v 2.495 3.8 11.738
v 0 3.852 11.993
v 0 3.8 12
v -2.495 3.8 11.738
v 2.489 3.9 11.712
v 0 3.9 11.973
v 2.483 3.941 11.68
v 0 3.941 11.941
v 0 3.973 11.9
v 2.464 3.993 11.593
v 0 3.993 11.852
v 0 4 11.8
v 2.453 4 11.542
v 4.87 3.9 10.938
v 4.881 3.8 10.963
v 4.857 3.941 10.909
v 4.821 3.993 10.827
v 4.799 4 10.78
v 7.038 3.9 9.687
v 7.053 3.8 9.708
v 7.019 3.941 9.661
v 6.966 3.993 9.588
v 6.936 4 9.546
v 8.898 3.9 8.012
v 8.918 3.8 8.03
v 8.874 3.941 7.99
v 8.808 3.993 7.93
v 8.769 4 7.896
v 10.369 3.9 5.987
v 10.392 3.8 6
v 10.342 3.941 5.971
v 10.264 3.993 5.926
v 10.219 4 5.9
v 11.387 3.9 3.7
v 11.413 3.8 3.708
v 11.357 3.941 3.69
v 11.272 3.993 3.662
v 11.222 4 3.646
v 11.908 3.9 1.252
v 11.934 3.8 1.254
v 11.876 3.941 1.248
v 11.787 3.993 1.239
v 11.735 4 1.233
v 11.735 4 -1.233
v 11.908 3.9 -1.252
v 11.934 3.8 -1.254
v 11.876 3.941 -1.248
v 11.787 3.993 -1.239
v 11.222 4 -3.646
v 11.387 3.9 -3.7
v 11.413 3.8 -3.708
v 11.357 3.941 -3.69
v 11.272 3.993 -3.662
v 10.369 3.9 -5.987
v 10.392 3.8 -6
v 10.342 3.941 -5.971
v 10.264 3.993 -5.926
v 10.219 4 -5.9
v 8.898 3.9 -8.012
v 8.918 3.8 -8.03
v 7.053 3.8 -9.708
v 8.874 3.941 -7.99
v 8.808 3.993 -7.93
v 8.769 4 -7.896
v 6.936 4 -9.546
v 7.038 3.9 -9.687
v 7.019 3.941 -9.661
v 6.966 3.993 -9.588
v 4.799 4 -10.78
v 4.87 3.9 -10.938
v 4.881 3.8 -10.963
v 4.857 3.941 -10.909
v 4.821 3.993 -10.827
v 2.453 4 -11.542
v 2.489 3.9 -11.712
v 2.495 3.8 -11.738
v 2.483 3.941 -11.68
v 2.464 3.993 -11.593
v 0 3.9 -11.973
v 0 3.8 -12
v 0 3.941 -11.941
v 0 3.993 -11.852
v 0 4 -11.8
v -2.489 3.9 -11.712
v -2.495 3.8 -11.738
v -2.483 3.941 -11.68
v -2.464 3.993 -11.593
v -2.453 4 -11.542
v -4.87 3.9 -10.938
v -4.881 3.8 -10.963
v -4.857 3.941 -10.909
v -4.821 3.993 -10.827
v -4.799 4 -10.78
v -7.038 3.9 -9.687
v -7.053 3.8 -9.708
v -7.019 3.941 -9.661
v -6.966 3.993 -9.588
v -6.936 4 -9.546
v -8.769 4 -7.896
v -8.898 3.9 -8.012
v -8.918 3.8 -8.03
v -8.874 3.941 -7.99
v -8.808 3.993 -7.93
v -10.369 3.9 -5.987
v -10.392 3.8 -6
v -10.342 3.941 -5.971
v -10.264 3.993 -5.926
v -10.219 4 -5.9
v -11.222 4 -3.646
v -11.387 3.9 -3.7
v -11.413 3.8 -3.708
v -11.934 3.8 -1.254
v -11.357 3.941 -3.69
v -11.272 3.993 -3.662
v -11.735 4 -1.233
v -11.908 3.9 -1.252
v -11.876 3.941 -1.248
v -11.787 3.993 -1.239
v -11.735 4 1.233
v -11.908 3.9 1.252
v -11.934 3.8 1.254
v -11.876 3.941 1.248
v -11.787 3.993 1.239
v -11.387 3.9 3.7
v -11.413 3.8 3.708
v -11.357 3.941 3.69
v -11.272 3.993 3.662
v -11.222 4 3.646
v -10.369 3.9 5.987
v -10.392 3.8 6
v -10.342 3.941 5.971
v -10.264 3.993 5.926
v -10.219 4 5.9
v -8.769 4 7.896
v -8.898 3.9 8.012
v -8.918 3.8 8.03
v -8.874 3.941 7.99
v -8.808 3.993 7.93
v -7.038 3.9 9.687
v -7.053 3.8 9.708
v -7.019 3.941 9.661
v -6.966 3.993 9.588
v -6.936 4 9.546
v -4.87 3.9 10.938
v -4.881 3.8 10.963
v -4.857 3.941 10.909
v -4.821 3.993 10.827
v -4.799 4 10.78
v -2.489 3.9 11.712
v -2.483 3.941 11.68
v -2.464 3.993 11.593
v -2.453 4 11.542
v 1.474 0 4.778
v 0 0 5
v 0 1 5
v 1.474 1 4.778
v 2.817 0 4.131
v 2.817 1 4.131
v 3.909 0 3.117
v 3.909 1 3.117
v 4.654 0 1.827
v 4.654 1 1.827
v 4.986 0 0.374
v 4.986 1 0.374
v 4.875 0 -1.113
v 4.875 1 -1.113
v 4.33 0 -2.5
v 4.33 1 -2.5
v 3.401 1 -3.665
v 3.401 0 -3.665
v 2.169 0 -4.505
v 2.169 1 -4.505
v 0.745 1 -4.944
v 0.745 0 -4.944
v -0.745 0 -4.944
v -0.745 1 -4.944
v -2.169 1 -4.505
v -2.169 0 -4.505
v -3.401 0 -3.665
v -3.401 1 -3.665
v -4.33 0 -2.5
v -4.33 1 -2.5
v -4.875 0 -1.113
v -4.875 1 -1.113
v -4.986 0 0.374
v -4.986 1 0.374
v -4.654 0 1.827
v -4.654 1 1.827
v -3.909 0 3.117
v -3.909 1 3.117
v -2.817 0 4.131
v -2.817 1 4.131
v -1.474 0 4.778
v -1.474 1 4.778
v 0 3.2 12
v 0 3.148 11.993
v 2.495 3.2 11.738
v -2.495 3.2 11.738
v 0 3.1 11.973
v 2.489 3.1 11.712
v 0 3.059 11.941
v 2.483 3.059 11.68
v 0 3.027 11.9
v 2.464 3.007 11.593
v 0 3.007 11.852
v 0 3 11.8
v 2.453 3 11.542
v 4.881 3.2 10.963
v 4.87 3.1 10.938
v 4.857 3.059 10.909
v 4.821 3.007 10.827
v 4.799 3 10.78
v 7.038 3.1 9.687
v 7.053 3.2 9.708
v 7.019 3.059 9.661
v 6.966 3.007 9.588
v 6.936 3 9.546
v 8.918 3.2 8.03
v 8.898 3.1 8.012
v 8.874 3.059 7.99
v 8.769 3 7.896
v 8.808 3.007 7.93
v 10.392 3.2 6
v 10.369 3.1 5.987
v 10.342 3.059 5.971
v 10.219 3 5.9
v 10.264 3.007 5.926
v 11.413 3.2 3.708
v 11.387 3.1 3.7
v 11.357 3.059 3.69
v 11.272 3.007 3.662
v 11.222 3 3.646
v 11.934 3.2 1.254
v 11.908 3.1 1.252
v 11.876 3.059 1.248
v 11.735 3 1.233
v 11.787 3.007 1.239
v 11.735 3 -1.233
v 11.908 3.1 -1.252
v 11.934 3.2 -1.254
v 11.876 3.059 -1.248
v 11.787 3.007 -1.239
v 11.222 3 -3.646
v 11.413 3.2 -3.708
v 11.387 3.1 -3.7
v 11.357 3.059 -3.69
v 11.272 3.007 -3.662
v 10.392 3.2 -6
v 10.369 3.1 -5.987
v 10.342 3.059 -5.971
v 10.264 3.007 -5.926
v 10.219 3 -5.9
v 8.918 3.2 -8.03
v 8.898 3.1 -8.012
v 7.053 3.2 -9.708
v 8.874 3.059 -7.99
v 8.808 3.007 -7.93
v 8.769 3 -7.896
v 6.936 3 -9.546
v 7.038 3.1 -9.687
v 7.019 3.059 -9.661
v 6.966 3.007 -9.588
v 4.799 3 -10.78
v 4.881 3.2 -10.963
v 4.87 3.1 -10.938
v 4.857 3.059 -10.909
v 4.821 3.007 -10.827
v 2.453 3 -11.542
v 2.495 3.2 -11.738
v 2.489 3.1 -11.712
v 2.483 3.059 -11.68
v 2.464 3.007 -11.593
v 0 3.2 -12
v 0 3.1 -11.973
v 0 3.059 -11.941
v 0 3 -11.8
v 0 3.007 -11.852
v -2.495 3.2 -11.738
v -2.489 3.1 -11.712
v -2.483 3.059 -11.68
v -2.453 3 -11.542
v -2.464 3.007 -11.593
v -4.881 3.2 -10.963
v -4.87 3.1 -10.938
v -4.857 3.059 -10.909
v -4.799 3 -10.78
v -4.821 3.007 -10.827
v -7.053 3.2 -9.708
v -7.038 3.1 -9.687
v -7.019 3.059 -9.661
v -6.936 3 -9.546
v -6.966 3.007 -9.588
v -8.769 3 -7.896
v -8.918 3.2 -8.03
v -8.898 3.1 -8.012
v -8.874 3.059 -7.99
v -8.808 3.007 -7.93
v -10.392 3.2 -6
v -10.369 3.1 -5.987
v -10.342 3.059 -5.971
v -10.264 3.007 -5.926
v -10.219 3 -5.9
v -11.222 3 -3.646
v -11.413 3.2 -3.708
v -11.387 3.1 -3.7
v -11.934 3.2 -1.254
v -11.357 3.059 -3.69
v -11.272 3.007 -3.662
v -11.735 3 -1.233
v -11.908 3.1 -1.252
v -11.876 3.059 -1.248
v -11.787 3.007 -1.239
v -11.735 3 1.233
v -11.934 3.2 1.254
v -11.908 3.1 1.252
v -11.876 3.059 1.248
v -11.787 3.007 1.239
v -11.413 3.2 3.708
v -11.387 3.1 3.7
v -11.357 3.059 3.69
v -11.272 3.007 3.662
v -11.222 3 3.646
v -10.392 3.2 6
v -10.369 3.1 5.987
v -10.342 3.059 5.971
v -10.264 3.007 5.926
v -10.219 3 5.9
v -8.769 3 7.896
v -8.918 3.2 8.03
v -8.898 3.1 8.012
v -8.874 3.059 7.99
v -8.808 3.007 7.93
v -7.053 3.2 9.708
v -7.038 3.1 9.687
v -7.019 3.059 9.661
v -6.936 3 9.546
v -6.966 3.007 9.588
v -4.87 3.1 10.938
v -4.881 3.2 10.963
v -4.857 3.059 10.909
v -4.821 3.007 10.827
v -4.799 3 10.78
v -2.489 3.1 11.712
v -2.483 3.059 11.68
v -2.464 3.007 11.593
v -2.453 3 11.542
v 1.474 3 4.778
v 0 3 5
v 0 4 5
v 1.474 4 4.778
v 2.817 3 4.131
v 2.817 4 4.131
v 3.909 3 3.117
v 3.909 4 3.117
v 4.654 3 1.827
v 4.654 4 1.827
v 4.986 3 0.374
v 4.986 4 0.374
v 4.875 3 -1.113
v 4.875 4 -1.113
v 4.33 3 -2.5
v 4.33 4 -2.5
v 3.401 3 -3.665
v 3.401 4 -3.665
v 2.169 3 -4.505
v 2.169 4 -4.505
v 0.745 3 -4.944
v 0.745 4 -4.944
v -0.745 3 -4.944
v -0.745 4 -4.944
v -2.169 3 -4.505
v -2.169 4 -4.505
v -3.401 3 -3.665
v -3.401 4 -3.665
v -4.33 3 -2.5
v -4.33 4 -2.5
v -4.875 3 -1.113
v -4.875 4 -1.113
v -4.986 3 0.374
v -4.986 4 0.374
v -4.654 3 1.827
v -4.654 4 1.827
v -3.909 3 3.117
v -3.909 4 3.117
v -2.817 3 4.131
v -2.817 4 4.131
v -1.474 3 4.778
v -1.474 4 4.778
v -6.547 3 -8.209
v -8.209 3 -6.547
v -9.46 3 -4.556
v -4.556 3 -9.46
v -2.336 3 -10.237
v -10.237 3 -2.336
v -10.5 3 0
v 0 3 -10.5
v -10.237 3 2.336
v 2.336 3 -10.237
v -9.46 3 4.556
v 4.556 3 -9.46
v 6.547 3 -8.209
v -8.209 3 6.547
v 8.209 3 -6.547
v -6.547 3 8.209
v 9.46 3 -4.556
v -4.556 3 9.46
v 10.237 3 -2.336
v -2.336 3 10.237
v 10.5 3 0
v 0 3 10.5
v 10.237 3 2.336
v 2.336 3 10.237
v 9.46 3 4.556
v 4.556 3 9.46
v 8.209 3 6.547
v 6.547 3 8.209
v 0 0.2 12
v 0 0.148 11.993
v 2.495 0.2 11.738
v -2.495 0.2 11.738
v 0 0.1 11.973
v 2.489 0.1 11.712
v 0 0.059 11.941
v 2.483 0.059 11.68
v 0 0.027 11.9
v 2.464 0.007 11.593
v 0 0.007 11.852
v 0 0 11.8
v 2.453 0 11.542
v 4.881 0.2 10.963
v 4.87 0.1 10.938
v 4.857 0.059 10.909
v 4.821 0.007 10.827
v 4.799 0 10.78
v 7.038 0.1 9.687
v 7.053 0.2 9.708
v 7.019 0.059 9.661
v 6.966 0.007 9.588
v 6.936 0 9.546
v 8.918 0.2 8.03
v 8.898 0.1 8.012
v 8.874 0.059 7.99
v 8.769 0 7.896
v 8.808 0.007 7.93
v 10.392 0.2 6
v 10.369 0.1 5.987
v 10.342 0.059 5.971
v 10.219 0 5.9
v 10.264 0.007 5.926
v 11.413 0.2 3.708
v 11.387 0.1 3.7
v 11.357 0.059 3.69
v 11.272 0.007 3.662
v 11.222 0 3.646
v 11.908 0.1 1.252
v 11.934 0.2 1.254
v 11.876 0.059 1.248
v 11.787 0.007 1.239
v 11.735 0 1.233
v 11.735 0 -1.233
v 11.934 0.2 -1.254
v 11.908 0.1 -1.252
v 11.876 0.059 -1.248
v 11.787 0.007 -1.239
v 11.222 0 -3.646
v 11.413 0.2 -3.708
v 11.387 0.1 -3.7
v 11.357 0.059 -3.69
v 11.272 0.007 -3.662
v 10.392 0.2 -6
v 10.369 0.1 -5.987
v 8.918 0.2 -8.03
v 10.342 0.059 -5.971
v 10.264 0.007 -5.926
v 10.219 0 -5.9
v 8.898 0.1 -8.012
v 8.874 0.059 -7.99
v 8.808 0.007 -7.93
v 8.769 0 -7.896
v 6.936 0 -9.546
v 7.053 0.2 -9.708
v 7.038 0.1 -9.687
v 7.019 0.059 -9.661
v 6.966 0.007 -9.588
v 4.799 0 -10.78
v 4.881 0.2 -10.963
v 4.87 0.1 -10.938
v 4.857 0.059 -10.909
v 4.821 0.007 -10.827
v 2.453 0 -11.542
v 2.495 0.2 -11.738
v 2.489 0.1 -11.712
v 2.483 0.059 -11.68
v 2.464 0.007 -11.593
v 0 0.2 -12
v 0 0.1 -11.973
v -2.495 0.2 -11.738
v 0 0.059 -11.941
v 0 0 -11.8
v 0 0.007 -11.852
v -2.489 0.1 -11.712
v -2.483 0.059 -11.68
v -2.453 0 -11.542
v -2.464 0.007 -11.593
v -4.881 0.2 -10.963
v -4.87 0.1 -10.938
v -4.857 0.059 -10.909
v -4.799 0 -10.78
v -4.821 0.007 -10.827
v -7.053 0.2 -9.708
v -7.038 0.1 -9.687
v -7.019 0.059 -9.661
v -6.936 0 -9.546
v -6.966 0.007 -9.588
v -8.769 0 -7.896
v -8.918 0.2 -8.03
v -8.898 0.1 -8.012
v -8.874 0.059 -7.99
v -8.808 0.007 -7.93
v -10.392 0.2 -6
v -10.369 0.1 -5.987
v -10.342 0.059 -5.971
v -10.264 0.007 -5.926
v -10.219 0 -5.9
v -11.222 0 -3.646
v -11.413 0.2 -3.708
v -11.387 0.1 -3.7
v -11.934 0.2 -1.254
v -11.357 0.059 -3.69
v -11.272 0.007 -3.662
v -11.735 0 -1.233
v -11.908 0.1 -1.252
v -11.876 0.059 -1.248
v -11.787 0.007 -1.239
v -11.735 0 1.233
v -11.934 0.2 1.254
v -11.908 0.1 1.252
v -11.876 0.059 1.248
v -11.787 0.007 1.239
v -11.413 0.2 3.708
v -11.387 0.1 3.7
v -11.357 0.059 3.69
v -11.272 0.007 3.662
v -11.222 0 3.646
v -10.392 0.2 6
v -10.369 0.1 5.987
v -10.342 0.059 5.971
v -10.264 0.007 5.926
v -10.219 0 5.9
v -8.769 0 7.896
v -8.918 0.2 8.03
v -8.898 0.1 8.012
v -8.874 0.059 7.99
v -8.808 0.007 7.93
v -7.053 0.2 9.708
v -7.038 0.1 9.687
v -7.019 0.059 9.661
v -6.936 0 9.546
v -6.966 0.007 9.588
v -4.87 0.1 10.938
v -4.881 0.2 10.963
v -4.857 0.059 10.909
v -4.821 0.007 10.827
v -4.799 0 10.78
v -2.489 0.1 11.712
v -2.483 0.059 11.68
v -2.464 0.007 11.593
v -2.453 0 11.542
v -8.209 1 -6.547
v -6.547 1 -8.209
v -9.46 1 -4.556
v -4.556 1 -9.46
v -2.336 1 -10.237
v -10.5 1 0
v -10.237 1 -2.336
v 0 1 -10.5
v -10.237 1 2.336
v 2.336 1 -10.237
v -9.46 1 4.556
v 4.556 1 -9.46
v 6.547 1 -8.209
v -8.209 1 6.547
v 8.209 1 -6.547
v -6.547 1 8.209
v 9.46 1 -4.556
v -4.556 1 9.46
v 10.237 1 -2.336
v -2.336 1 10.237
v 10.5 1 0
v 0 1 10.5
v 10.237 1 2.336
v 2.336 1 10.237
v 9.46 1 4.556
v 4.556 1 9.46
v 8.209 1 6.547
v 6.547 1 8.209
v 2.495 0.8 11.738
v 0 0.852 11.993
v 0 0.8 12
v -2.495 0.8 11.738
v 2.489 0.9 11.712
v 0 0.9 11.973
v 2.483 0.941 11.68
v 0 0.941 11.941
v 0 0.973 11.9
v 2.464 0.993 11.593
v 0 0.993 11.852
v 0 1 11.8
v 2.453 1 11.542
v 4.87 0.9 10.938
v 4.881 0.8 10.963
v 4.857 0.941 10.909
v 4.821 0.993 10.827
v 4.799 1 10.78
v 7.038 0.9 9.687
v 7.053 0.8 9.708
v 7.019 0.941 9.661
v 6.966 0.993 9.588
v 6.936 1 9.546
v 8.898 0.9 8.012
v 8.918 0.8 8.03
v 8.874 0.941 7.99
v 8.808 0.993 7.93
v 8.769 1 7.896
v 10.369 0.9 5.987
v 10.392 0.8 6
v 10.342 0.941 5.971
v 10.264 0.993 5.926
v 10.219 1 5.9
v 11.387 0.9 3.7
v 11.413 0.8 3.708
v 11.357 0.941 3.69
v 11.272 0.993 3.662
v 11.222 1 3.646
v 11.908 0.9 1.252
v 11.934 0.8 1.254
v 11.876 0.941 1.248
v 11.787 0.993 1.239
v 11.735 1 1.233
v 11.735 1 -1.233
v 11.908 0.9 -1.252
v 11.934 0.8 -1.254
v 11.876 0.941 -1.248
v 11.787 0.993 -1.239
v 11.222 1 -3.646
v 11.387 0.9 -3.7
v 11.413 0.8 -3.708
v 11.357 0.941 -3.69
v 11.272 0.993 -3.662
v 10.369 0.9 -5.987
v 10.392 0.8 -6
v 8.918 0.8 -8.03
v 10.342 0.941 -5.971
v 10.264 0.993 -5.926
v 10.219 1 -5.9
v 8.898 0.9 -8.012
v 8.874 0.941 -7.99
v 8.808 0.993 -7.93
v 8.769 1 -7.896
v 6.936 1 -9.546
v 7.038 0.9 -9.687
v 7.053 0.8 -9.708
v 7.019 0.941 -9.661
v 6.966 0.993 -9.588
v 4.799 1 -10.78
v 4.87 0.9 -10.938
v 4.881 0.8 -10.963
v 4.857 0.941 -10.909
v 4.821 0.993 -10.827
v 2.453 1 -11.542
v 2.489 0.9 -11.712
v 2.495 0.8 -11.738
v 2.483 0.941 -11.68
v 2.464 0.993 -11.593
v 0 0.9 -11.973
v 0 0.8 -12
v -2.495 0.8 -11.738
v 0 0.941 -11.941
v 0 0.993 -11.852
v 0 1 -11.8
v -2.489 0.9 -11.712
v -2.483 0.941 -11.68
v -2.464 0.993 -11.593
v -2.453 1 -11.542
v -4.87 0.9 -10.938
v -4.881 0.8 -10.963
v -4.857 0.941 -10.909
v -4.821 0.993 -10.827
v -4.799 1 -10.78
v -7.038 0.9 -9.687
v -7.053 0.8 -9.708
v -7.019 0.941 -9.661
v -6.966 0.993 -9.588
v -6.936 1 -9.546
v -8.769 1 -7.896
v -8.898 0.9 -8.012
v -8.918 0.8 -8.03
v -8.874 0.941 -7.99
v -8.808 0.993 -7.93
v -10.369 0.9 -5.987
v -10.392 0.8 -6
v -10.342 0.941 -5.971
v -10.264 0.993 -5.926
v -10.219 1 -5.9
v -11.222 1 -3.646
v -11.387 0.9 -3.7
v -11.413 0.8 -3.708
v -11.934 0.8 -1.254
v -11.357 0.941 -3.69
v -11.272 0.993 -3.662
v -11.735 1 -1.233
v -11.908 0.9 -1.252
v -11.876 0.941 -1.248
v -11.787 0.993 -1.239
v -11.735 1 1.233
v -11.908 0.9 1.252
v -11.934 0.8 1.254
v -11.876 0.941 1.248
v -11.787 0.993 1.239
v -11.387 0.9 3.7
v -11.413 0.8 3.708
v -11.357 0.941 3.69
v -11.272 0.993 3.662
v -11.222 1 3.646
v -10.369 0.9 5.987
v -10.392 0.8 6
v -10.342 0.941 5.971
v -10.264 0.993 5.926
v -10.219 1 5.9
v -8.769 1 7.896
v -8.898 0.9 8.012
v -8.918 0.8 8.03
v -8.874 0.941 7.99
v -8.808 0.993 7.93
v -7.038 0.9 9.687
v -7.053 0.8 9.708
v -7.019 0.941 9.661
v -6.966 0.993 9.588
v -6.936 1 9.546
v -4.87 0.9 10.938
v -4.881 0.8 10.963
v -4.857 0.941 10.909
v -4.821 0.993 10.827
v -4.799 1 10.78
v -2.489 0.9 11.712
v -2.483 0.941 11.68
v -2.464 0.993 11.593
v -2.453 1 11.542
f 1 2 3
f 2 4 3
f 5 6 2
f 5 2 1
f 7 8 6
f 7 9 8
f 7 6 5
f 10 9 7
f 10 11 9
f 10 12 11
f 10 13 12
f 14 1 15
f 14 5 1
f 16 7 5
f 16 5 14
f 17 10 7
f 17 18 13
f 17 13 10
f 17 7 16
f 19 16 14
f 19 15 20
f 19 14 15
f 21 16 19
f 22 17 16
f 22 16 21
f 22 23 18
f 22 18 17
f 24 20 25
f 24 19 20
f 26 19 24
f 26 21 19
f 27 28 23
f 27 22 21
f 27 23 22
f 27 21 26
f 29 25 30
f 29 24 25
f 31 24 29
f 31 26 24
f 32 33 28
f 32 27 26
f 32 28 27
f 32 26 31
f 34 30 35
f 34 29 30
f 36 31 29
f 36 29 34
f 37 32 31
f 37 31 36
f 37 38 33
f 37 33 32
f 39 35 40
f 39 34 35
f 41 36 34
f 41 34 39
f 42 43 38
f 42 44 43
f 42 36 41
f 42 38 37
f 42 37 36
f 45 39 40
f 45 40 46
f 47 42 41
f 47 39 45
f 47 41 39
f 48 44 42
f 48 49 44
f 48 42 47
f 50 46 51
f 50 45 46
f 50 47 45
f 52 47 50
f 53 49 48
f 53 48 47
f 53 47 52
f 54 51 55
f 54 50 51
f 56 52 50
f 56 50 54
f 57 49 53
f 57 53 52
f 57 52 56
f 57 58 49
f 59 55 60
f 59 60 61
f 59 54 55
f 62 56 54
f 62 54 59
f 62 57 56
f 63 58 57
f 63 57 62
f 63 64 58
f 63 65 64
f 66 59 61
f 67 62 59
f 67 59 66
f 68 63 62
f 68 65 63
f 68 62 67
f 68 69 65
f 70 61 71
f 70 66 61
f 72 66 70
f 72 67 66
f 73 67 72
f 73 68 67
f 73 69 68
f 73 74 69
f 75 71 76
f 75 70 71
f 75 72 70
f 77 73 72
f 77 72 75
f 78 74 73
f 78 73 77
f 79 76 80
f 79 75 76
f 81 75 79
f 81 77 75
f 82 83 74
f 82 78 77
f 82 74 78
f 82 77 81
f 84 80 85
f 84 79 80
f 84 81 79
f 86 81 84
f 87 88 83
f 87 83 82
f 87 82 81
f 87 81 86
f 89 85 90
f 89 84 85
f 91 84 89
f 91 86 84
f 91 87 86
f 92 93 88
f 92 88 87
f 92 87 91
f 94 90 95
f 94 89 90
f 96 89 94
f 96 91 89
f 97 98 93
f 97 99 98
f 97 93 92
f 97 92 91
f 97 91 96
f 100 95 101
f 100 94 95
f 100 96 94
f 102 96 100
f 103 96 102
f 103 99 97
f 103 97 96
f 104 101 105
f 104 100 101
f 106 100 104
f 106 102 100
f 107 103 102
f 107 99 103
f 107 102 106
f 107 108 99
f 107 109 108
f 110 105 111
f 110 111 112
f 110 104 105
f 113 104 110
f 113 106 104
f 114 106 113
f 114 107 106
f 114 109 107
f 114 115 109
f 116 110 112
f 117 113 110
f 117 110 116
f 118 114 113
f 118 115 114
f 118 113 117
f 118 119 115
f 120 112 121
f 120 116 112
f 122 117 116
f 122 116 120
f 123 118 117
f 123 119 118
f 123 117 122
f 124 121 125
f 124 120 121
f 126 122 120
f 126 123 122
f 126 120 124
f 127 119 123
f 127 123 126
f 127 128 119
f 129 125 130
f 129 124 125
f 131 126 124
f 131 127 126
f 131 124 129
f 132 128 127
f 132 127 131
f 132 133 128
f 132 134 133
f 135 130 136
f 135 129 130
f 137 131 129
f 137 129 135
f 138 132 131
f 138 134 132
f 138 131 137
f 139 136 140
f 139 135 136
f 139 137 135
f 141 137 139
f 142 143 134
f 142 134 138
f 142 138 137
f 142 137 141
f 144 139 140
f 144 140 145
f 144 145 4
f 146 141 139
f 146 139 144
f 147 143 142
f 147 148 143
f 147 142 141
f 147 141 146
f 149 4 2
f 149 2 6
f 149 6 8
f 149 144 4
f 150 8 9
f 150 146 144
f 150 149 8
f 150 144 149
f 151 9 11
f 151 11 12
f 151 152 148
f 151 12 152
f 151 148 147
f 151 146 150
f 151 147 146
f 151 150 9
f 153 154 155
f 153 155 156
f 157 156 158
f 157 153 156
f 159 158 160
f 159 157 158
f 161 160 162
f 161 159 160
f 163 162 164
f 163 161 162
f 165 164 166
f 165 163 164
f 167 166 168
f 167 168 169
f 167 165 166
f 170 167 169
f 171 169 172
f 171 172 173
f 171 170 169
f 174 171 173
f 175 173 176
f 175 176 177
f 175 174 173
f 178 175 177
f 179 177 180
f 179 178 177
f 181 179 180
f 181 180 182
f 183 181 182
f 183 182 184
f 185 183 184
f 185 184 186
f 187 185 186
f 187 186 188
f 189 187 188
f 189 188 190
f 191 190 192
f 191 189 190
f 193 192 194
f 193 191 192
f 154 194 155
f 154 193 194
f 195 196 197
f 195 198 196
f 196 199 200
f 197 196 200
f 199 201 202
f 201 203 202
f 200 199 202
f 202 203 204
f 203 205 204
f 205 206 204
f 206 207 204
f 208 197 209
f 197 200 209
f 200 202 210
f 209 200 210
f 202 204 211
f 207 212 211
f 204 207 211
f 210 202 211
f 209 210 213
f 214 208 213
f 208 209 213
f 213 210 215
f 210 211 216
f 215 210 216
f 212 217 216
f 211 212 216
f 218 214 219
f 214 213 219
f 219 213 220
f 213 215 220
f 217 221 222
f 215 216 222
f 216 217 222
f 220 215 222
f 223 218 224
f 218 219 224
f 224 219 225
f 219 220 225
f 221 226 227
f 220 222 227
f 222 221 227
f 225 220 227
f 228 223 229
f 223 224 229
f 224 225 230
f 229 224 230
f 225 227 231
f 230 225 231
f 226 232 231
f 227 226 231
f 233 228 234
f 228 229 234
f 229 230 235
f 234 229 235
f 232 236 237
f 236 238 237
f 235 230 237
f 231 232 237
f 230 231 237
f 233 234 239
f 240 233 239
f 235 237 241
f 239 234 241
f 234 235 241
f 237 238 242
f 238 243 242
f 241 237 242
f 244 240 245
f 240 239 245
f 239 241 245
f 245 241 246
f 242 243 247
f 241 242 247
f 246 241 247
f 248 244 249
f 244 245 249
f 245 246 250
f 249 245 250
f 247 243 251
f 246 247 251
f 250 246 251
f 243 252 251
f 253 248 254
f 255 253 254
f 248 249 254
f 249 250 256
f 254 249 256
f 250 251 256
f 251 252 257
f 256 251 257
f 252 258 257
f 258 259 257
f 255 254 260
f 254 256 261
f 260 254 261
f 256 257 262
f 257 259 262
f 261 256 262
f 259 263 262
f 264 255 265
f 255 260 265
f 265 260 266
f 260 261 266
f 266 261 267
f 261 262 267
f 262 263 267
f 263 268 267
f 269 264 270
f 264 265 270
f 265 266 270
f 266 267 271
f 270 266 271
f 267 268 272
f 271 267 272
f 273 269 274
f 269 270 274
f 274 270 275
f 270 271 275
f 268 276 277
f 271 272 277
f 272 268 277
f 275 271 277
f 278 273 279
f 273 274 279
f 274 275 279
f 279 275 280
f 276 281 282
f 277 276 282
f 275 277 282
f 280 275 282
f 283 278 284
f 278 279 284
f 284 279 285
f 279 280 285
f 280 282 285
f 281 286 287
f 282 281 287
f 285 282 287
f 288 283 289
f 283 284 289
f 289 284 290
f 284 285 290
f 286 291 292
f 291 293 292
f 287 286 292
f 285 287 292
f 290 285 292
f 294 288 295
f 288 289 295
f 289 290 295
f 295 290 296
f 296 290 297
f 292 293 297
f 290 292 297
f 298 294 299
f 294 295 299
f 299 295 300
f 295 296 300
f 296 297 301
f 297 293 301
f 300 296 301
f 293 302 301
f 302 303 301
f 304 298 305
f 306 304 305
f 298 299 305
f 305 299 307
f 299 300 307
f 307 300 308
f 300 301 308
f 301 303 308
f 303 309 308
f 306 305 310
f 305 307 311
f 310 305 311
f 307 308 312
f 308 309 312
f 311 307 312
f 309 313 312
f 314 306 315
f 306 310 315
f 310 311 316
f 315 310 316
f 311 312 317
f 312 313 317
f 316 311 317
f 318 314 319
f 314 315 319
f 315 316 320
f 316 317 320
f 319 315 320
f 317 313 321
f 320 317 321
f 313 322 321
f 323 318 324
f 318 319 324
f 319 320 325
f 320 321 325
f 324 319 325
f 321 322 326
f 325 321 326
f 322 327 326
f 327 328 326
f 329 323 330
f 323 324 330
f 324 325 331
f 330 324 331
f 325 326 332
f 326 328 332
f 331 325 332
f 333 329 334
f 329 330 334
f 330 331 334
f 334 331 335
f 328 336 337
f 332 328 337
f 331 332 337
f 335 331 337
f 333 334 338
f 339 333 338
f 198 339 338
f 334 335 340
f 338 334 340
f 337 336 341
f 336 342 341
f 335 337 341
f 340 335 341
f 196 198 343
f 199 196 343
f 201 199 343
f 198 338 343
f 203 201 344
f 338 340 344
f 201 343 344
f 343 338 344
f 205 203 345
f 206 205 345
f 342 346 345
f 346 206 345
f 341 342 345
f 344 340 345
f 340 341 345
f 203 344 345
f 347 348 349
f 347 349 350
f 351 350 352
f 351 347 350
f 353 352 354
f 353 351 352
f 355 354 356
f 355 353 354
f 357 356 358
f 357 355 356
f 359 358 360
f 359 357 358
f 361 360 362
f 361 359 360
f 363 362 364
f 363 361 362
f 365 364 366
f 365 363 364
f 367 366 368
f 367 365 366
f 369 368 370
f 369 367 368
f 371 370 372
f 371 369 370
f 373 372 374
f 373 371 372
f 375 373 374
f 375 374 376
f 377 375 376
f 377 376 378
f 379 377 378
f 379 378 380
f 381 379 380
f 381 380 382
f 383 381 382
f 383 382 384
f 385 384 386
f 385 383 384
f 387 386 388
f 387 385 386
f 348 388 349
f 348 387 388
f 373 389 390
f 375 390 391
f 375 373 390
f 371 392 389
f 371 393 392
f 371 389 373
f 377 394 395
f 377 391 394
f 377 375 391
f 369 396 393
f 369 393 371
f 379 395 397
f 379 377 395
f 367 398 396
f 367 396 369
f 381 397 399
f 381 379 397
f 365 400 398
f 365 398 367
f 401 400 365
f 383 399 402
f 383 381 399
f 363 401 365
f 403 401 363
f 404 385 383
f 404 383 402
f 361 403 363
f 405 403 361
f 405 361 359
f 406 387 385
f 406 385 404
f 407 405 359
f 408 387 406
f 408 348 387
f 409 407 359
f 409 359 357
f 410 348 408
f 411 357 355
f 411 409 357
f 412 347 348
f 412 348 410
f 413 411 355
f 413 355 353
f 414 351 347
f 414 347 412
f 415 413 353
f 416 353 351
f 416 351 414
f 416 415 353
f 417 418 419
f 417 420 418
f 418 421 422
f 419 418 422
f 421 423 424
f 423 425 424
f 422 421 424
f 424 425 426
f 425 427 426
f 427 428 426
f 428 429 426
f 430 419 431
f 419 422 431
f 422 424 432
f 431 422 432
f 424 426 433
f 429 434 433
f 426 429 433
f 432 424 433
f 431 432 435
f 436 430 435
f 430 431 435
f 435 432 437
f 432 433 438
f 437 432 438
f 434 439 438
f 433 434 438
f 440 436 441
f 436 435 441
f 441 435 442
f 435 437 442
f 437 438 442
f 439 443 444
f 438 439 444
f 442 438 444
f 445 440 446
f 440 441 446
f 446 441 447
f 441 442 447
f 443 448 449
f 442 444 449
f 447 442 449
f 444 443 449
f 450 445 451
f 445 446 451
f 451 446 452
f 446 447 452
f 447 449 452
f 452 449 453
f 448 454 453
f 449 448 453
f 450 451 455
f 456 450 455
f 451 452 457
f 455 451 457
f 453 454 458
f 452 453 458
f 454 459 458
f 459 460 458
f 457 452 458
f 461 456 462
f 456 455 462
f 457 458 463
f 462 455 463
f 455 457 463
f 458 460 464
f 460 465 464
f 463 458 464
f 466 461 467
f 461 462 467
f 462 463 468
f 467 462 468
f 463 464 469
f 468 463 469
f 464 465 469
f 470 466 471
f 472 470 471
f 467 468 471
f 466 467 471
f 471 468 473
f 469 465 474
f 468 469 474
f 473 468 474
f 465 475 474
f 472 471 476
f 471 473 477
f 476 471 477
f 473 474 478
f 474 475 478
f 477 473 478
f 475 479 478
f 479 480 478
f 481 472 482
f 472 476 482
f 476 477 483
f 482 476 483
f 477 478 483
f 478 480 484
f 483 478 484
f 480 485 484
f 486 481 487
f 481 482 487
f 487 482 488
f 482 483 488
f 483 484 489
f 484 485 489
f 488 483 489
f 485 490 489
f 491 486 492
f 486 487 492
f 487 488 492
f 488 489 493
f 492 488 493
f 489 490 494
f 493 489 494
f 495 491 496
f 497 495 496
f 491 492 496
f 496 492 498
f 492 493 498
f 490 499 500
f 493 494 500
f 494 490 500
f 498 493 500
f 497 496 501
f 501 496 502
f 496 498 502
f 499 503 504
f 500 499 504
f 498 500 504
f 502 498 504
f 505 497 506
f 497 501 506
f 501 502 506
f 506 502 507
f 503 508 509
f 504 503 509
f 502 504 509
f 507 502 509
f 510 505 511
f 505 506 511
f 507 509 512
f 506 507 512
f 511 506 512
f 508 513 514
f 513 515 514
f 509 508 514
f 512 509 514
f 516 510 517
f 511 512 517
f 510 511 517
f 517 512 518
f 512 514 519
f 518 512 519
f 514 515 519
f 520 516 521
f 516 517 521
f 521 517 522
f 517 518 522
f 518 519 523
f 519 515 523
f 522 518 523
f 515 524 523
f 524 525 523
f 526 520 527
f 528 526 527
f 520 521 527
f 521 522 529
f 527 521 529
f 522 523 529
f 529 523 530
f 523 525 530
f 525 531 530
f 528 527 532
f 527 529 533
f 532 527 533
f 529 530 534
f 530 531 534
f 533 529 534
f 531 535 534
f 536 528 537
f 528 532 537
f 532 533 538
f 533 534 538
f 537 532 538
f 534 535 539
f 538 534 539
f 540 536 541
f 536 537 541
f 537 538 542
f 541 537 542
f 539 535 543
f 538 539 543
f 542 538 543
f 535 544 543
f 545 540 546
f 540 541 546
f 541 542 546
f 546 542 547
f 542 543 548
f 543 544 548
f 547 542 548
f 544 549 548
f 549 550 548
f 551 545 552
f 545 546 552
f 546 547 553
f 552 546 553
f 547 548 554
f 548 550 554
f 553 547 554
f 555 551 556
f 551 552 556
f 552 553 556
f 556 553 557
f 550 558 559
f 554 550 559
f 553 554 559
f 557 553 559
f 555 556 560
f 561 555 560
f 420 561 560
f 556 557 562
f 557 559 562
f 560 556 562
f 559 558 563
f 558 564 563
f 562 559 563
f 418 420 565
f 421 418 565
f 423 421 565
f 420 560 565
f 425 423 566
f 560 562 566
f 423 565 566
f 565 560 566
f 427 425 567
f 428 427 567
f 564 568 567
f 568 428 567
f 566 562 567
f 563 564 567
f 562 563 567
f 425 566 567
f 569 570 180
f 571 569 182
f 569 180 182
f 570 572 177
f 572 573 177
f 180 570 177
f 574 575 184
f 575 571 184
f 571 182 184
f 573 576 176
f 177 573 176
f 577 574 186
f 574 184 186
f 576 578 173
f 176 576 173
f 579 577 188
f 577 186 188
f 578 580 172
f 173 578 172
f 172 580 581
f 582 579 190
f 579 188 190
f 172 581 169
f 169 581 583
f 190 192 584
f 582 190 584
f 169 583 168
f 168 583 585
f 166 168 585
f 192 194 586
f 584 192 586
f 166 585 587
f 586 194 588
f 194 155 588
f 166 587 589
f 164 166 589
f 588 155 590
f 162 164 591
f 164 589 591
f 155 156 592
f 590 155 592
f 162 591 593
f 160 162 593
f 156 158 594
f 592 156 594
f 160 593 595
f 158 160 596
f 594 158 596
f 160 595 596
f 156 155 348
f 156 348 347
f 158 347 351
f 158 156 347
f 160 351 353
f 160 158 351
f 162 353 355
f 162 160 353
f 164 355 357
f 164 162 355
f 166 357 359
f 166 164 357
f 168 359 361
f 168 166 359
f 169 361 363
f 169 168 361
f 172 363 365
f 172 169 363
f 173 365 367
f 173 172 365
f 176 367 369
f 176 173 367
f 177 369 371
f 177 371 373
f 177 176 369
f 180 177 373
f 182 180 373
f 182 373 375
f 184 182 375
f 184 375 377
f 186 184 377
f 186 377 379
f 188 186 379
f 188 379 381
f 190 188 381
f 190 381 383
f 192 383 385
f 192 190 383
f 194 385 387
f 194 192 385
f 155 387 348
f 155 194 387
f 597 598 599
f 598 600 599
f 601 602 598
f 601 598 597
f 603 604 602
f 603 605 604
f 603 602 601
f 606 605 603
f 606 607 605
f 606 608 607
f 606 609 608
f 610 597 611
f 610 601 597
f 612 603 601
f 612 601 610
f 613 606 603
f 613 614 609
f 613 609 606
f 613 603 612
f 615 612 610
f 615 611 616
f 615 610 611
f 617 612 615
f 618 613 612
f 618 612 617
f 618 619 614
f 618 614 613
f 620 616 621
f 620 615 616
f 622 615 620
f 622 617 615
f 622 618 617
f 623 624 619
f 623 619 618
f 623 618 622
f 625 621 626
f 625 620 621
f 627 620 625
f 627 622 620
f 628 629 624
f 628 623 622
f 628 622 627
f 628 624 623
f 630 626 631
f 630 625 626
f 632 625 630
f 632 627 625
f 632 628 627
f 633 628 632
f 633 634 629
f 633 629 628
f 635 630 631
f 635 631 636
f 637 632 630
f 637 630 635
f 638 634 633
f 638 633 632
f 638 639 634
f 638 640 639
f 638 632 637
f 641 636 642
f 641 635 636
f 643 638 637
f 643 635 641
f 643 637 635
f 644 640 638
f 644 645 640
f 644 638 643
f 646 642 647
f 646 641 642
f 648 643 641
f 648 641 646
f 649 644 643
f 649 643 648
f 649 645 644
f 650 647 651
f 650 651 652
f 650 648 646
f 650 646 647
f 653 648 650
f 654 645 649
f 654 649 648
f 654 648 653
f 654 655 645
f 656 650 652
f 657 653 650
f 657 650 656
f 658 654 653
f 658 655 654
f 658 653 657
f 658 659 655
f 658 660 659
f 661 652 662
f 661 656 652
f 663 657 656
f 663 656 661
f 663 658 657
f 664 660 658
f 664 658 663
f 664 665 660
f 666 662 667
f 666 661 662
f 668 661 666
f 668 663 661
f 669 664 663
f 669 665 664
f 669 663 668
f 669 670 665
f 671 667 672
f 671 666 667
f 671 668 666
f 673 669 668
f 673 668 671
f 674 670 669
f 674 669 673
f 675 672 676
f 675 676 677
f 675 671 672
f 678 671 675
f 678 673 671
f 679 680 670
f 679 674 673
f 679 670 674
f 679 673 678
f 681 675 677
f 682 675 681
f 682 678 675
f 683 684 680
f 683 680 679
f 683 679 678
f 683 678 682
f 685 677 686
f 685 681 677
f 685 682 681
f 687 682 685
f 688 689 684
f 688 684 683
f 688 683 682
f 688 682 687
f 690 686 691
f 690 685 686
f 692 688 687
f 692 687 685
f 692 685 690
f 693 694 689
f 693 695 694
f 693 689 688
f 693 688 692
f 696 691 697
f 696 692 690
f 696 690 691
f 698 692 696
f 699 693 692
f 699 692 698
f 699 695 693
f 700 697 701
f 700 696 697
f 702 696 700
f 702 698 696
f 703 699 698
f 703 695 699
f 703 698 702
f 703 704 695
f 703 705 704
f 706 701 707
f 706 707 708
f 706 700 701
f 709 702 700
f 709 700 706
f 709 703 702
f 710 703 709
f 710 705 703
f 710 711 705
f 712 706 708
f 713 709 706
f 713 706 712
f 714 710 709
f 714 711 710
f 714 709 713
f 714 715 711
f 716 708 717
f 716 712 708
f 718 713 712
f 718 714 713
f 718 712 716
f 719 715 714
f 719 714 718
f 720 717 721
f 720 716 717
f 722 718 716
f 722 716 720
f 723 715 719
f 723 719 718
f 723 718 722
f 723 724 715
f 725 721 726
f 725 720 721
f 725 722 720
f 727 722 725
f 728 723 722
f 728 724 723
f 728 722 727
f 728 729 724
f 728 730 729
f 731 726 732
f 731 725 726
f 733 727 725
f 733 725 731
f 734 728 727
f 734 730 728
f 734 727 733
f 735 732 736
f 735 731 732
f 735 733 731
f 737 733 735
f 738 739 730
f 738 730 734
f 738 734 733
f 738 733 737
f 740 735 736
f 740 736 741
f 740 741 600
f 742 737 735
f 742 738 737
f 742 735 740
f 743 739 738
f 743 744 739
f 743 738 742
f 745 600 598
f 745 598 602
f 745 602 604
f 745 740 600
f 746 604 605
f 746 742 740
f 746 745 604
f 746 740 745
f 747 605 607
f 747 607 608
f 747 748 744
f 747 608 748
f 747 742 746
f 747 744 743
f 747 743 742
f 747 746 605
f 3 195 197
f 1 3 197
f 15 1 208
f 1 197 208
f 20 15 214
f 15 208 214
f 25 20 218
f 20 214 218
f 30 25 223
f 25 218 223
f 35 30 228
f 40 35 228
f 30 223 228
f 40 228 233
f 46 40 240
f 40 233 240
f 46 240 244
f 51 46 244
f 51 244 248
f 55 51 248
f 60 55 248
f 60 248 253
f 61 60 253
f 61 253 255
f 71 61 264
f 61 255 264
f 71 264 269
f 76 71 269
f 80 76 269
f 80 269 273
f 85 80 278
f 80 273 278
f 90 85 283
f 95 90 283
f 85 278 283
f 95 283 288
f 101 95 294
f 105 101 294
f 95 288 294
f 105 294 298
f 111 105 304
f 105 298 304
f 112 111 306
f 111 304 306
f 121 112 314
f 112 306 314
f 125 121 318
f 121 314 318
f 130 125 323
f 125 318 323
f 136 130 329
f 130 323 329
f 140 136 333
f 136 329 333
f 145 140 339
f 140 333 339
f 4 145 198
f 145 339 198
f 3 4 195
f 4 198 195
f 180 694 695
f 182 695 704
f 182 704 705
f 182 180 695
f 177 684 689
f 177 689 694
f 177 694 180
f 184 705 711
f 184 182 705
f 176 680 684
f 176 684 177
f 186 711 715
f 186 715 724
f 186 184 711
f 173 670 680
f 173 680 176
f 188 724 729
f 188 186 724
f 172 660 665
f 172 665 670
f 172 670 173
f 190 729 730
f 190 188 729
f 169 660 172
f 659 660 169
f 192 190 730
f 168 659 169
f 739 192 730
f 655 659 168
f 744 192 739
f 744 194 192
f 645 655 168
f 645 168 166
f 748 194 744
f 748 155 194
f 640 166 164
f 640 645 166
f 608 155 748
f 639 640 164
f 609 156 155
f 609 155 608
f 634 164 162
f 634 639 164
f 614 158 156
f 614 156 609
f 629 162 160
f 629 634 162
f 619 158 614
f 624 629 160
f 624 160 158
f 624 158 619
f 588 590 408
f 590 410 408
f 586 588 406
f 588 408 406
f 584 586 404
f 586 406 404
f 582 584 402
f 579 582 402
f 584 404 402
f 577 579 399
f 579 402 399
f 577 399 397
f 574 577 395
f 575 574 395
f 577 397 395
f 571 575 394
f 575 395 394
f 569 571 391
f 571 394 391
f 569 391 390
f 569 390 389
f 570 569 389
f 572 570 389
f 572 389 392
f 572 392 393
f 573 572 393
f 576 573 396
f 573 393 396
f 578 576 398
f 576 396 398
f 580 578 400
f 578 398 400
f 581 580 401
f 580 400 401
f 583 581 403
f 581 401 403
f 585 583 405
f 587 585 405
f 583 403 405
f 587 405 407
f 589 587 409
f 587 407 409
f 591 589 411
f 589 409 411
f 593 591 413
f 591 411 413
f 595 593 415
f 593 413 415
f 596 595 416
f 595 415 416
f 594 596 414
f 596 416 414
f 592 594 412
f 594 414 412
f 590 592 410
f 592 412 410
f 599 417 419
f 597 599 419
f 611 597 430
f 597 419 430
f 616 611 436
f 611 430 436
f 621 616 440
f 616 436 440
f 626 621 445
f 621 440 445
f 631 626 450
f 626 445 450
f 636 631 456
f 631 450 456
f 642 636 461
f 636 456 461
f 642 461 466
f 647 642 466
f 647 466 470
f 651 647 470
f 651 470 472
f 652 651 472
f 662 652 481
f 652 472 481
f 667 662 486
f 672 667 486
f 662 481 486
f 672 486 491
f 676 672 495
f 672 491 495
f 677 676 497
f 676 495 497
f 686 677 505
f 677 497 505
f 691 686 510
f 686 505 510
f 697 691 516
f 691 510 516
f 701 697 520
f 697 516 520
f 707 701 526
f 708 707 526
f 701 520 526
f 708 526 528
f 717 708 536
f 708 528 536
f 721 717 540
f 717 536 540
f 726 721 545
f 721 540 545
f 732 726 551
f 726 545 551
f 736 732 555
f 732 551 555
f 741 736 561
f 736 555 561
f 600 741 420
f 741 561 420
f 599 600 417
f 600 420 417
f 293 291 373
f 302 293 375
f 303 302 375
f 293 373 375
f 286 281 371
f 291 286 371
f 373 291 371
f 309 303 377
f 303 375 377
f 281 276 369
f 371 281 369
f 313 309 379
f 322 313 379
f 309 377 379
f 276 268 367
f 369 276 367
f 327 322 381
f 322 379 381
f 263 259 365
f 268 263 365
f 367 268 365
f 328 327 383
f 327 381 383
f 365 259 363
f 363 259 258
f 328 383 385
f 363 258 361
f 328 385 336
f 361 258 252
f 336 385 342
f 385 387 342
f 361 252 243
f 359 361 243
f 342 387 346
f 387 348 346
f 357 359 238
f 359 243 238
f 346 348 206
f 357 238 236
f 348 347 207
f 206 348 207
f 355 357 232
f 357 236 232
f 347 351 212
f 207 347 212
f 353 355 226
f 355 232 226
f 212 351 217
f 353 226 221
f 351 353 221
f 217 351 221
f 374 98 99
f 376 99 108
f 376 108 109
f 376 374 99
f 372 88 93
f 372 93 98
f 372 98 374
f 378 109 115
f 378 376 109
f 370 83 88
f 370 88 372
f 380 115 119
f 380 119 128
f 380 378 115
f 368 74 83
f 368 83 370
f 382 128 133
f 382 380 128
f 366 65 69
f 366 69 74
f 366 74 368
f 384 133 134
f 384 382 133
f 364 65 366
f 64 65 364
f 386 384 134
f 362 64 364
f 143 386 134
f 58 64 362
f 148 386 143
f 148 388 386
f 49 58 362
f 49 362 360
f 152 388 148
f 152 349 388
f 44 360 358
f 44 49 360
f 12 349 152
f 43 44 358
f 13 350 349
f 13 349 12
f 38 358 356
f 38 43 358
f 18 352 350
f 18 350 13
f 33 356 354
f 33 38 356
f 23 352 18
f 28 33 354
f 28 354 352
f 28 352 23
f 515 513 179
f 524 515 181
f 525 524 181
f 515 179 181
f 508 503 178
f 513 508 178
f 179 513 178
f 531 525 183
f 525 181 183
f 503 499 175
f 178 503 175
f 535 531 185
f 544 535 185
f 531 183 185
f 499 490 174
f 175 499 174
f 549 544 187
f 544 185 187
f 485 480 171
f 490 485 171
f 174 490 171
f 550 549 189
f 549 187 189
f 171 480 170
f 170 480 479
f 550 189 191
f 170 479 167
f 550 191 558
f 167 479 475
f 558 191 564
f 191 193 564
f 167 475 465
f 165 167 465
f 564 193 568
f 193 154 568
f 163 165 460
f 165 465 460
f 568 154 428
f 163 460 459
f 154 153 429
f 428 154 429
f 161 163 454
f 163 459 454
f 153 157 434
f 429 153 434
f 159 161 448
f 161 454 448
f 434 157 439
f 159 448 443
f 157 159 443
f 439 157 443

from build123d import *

# Parameters (mm, degrees)
SKETCH_1_R      = 12
SKETCH_1_R_2    = 5
EXTRUDE_1_DEPTH = 1
SKETCH_3_R      = 12
SKETCH_3_R_2    = 5
EXTRUDE_2_DEPTH = 2
SKETCH_4_R      = 12
SKETCH_4_R_2    = 5
EXTRUDE_3_DEPTH = 1
SKETCH_5_W      = 3
SKETCH_5_H      = 2
FILLET_1_R      = 0.2
FILLET_2_R      = 0.2
FILLET_3_R      = 0.2
FILLET_4_R      = 0.2


with BuildPart() as part:
    # 草图1 → 凸台-拉伸1 (new body)
    with BuildSketch(Plane(origin=(0, 0, 0), x_dir=(1, 0, 0), z_dir=(0, 1, 0))):
        with Locations(Location((0, 0, 0), (0, 0, 270))):
            Circle(SKETCH_1_R)
        with Locations(Location((0, 0, 0), (0, 0, 270))):
            Circle(SKETCH_1_R_2, mode=Mode.SUBTRACT)
    extrude(amount=EXTRUDE_1_DEPTH)

    # 圆角3
    fillet_3_edges = [part.edges().sort_by_distance(p)[0] for p in [
        (0, 1, -12),
    ]]
    fillet(fillet_3_edges, radius=FILLET_3_R)

    # 圆角4
    fillet_4_edges = [part.edges().sort_by_distance(p)[0] for p in [
        (0, 0, -12),
    ]]
    fillet(fillet_4_edges, radius=FILLET_4_R)


with BuildPart() as body_2:
    # 草图3 → 凸台-拉伸2 (new body)
    with BuildSketch(Plane(origin=(0, 1, 0), x_dir=(1, 0, 0), z_dir=(0, 1, 0))):
        with Locations(Location((0, 0, 0), (0, 0, 270))):
            Circle(SKETCH_3_R)
        with Locations(Location((0, 0, 0), (0, 0, 270))):
            Circle(SKETCH_3_R_2, mode=Mode.SUBTRACT)
    extrude(amount=EXTRUDE_2_DEPTH)

    # 草图5 → 切除-旋转1 (revolve, cut)
    with BuildSketch(Plane(origin=(0, 0, 0), x_dir=(0, 0, -1), z_dir=(1, 0, 0)), mode=Mode.PRIVATE) as cut_revolve_1_sk:
        with Locations((12, 2)):
            Rectangle(SKETCH_5_W, SKETCH_5_H)
    revolve(cut_revolve_1_sk.sketch.rotate(Axis((0, 3, 0), (0, -1, 0)), 180), axis=Axis((0, 3, 0), (0, -1, 0)), mode=Mode.SUBTRACT)


with BuildPart() as body_3:
    # 草图4 → 凸台-拉伸3 (new body)
    with BuildSketch(Plane(origin=(0, 3, 0), x_dir=(1, 0, 0), z_dir=(0, 1, 0))):
        with Locations(Location((0, 0, 0), (0, 0, 270))):
            Circle(SKETCH_4_R)
        with Locations(Location((0, 0, 0), (0, 0, 270))):
            Circle(SKETCH_4_R_2, mode=Mode.SUBTRACT)
    extrude(amount=EXTRUDE_3_DEPTH)

    # 圆角1
    fillet_1_edges = [body_3.edges().sort_by_distance(p)[0] for p in [
        (0, 4, -12),
    ]]
    fillet(fillet_1_edges, radius=FILLET_1_R)

    # 圆角2
    fillet_2_edges = [body_3.edges().sort_by_distance(p)[0] for p in [
        (0, 3, -12),
    ]]
    fillet(fillet_2_edges, radius=FILLET_2_R)


solid = Compound([part.part, body_2.part, body_3.part])
